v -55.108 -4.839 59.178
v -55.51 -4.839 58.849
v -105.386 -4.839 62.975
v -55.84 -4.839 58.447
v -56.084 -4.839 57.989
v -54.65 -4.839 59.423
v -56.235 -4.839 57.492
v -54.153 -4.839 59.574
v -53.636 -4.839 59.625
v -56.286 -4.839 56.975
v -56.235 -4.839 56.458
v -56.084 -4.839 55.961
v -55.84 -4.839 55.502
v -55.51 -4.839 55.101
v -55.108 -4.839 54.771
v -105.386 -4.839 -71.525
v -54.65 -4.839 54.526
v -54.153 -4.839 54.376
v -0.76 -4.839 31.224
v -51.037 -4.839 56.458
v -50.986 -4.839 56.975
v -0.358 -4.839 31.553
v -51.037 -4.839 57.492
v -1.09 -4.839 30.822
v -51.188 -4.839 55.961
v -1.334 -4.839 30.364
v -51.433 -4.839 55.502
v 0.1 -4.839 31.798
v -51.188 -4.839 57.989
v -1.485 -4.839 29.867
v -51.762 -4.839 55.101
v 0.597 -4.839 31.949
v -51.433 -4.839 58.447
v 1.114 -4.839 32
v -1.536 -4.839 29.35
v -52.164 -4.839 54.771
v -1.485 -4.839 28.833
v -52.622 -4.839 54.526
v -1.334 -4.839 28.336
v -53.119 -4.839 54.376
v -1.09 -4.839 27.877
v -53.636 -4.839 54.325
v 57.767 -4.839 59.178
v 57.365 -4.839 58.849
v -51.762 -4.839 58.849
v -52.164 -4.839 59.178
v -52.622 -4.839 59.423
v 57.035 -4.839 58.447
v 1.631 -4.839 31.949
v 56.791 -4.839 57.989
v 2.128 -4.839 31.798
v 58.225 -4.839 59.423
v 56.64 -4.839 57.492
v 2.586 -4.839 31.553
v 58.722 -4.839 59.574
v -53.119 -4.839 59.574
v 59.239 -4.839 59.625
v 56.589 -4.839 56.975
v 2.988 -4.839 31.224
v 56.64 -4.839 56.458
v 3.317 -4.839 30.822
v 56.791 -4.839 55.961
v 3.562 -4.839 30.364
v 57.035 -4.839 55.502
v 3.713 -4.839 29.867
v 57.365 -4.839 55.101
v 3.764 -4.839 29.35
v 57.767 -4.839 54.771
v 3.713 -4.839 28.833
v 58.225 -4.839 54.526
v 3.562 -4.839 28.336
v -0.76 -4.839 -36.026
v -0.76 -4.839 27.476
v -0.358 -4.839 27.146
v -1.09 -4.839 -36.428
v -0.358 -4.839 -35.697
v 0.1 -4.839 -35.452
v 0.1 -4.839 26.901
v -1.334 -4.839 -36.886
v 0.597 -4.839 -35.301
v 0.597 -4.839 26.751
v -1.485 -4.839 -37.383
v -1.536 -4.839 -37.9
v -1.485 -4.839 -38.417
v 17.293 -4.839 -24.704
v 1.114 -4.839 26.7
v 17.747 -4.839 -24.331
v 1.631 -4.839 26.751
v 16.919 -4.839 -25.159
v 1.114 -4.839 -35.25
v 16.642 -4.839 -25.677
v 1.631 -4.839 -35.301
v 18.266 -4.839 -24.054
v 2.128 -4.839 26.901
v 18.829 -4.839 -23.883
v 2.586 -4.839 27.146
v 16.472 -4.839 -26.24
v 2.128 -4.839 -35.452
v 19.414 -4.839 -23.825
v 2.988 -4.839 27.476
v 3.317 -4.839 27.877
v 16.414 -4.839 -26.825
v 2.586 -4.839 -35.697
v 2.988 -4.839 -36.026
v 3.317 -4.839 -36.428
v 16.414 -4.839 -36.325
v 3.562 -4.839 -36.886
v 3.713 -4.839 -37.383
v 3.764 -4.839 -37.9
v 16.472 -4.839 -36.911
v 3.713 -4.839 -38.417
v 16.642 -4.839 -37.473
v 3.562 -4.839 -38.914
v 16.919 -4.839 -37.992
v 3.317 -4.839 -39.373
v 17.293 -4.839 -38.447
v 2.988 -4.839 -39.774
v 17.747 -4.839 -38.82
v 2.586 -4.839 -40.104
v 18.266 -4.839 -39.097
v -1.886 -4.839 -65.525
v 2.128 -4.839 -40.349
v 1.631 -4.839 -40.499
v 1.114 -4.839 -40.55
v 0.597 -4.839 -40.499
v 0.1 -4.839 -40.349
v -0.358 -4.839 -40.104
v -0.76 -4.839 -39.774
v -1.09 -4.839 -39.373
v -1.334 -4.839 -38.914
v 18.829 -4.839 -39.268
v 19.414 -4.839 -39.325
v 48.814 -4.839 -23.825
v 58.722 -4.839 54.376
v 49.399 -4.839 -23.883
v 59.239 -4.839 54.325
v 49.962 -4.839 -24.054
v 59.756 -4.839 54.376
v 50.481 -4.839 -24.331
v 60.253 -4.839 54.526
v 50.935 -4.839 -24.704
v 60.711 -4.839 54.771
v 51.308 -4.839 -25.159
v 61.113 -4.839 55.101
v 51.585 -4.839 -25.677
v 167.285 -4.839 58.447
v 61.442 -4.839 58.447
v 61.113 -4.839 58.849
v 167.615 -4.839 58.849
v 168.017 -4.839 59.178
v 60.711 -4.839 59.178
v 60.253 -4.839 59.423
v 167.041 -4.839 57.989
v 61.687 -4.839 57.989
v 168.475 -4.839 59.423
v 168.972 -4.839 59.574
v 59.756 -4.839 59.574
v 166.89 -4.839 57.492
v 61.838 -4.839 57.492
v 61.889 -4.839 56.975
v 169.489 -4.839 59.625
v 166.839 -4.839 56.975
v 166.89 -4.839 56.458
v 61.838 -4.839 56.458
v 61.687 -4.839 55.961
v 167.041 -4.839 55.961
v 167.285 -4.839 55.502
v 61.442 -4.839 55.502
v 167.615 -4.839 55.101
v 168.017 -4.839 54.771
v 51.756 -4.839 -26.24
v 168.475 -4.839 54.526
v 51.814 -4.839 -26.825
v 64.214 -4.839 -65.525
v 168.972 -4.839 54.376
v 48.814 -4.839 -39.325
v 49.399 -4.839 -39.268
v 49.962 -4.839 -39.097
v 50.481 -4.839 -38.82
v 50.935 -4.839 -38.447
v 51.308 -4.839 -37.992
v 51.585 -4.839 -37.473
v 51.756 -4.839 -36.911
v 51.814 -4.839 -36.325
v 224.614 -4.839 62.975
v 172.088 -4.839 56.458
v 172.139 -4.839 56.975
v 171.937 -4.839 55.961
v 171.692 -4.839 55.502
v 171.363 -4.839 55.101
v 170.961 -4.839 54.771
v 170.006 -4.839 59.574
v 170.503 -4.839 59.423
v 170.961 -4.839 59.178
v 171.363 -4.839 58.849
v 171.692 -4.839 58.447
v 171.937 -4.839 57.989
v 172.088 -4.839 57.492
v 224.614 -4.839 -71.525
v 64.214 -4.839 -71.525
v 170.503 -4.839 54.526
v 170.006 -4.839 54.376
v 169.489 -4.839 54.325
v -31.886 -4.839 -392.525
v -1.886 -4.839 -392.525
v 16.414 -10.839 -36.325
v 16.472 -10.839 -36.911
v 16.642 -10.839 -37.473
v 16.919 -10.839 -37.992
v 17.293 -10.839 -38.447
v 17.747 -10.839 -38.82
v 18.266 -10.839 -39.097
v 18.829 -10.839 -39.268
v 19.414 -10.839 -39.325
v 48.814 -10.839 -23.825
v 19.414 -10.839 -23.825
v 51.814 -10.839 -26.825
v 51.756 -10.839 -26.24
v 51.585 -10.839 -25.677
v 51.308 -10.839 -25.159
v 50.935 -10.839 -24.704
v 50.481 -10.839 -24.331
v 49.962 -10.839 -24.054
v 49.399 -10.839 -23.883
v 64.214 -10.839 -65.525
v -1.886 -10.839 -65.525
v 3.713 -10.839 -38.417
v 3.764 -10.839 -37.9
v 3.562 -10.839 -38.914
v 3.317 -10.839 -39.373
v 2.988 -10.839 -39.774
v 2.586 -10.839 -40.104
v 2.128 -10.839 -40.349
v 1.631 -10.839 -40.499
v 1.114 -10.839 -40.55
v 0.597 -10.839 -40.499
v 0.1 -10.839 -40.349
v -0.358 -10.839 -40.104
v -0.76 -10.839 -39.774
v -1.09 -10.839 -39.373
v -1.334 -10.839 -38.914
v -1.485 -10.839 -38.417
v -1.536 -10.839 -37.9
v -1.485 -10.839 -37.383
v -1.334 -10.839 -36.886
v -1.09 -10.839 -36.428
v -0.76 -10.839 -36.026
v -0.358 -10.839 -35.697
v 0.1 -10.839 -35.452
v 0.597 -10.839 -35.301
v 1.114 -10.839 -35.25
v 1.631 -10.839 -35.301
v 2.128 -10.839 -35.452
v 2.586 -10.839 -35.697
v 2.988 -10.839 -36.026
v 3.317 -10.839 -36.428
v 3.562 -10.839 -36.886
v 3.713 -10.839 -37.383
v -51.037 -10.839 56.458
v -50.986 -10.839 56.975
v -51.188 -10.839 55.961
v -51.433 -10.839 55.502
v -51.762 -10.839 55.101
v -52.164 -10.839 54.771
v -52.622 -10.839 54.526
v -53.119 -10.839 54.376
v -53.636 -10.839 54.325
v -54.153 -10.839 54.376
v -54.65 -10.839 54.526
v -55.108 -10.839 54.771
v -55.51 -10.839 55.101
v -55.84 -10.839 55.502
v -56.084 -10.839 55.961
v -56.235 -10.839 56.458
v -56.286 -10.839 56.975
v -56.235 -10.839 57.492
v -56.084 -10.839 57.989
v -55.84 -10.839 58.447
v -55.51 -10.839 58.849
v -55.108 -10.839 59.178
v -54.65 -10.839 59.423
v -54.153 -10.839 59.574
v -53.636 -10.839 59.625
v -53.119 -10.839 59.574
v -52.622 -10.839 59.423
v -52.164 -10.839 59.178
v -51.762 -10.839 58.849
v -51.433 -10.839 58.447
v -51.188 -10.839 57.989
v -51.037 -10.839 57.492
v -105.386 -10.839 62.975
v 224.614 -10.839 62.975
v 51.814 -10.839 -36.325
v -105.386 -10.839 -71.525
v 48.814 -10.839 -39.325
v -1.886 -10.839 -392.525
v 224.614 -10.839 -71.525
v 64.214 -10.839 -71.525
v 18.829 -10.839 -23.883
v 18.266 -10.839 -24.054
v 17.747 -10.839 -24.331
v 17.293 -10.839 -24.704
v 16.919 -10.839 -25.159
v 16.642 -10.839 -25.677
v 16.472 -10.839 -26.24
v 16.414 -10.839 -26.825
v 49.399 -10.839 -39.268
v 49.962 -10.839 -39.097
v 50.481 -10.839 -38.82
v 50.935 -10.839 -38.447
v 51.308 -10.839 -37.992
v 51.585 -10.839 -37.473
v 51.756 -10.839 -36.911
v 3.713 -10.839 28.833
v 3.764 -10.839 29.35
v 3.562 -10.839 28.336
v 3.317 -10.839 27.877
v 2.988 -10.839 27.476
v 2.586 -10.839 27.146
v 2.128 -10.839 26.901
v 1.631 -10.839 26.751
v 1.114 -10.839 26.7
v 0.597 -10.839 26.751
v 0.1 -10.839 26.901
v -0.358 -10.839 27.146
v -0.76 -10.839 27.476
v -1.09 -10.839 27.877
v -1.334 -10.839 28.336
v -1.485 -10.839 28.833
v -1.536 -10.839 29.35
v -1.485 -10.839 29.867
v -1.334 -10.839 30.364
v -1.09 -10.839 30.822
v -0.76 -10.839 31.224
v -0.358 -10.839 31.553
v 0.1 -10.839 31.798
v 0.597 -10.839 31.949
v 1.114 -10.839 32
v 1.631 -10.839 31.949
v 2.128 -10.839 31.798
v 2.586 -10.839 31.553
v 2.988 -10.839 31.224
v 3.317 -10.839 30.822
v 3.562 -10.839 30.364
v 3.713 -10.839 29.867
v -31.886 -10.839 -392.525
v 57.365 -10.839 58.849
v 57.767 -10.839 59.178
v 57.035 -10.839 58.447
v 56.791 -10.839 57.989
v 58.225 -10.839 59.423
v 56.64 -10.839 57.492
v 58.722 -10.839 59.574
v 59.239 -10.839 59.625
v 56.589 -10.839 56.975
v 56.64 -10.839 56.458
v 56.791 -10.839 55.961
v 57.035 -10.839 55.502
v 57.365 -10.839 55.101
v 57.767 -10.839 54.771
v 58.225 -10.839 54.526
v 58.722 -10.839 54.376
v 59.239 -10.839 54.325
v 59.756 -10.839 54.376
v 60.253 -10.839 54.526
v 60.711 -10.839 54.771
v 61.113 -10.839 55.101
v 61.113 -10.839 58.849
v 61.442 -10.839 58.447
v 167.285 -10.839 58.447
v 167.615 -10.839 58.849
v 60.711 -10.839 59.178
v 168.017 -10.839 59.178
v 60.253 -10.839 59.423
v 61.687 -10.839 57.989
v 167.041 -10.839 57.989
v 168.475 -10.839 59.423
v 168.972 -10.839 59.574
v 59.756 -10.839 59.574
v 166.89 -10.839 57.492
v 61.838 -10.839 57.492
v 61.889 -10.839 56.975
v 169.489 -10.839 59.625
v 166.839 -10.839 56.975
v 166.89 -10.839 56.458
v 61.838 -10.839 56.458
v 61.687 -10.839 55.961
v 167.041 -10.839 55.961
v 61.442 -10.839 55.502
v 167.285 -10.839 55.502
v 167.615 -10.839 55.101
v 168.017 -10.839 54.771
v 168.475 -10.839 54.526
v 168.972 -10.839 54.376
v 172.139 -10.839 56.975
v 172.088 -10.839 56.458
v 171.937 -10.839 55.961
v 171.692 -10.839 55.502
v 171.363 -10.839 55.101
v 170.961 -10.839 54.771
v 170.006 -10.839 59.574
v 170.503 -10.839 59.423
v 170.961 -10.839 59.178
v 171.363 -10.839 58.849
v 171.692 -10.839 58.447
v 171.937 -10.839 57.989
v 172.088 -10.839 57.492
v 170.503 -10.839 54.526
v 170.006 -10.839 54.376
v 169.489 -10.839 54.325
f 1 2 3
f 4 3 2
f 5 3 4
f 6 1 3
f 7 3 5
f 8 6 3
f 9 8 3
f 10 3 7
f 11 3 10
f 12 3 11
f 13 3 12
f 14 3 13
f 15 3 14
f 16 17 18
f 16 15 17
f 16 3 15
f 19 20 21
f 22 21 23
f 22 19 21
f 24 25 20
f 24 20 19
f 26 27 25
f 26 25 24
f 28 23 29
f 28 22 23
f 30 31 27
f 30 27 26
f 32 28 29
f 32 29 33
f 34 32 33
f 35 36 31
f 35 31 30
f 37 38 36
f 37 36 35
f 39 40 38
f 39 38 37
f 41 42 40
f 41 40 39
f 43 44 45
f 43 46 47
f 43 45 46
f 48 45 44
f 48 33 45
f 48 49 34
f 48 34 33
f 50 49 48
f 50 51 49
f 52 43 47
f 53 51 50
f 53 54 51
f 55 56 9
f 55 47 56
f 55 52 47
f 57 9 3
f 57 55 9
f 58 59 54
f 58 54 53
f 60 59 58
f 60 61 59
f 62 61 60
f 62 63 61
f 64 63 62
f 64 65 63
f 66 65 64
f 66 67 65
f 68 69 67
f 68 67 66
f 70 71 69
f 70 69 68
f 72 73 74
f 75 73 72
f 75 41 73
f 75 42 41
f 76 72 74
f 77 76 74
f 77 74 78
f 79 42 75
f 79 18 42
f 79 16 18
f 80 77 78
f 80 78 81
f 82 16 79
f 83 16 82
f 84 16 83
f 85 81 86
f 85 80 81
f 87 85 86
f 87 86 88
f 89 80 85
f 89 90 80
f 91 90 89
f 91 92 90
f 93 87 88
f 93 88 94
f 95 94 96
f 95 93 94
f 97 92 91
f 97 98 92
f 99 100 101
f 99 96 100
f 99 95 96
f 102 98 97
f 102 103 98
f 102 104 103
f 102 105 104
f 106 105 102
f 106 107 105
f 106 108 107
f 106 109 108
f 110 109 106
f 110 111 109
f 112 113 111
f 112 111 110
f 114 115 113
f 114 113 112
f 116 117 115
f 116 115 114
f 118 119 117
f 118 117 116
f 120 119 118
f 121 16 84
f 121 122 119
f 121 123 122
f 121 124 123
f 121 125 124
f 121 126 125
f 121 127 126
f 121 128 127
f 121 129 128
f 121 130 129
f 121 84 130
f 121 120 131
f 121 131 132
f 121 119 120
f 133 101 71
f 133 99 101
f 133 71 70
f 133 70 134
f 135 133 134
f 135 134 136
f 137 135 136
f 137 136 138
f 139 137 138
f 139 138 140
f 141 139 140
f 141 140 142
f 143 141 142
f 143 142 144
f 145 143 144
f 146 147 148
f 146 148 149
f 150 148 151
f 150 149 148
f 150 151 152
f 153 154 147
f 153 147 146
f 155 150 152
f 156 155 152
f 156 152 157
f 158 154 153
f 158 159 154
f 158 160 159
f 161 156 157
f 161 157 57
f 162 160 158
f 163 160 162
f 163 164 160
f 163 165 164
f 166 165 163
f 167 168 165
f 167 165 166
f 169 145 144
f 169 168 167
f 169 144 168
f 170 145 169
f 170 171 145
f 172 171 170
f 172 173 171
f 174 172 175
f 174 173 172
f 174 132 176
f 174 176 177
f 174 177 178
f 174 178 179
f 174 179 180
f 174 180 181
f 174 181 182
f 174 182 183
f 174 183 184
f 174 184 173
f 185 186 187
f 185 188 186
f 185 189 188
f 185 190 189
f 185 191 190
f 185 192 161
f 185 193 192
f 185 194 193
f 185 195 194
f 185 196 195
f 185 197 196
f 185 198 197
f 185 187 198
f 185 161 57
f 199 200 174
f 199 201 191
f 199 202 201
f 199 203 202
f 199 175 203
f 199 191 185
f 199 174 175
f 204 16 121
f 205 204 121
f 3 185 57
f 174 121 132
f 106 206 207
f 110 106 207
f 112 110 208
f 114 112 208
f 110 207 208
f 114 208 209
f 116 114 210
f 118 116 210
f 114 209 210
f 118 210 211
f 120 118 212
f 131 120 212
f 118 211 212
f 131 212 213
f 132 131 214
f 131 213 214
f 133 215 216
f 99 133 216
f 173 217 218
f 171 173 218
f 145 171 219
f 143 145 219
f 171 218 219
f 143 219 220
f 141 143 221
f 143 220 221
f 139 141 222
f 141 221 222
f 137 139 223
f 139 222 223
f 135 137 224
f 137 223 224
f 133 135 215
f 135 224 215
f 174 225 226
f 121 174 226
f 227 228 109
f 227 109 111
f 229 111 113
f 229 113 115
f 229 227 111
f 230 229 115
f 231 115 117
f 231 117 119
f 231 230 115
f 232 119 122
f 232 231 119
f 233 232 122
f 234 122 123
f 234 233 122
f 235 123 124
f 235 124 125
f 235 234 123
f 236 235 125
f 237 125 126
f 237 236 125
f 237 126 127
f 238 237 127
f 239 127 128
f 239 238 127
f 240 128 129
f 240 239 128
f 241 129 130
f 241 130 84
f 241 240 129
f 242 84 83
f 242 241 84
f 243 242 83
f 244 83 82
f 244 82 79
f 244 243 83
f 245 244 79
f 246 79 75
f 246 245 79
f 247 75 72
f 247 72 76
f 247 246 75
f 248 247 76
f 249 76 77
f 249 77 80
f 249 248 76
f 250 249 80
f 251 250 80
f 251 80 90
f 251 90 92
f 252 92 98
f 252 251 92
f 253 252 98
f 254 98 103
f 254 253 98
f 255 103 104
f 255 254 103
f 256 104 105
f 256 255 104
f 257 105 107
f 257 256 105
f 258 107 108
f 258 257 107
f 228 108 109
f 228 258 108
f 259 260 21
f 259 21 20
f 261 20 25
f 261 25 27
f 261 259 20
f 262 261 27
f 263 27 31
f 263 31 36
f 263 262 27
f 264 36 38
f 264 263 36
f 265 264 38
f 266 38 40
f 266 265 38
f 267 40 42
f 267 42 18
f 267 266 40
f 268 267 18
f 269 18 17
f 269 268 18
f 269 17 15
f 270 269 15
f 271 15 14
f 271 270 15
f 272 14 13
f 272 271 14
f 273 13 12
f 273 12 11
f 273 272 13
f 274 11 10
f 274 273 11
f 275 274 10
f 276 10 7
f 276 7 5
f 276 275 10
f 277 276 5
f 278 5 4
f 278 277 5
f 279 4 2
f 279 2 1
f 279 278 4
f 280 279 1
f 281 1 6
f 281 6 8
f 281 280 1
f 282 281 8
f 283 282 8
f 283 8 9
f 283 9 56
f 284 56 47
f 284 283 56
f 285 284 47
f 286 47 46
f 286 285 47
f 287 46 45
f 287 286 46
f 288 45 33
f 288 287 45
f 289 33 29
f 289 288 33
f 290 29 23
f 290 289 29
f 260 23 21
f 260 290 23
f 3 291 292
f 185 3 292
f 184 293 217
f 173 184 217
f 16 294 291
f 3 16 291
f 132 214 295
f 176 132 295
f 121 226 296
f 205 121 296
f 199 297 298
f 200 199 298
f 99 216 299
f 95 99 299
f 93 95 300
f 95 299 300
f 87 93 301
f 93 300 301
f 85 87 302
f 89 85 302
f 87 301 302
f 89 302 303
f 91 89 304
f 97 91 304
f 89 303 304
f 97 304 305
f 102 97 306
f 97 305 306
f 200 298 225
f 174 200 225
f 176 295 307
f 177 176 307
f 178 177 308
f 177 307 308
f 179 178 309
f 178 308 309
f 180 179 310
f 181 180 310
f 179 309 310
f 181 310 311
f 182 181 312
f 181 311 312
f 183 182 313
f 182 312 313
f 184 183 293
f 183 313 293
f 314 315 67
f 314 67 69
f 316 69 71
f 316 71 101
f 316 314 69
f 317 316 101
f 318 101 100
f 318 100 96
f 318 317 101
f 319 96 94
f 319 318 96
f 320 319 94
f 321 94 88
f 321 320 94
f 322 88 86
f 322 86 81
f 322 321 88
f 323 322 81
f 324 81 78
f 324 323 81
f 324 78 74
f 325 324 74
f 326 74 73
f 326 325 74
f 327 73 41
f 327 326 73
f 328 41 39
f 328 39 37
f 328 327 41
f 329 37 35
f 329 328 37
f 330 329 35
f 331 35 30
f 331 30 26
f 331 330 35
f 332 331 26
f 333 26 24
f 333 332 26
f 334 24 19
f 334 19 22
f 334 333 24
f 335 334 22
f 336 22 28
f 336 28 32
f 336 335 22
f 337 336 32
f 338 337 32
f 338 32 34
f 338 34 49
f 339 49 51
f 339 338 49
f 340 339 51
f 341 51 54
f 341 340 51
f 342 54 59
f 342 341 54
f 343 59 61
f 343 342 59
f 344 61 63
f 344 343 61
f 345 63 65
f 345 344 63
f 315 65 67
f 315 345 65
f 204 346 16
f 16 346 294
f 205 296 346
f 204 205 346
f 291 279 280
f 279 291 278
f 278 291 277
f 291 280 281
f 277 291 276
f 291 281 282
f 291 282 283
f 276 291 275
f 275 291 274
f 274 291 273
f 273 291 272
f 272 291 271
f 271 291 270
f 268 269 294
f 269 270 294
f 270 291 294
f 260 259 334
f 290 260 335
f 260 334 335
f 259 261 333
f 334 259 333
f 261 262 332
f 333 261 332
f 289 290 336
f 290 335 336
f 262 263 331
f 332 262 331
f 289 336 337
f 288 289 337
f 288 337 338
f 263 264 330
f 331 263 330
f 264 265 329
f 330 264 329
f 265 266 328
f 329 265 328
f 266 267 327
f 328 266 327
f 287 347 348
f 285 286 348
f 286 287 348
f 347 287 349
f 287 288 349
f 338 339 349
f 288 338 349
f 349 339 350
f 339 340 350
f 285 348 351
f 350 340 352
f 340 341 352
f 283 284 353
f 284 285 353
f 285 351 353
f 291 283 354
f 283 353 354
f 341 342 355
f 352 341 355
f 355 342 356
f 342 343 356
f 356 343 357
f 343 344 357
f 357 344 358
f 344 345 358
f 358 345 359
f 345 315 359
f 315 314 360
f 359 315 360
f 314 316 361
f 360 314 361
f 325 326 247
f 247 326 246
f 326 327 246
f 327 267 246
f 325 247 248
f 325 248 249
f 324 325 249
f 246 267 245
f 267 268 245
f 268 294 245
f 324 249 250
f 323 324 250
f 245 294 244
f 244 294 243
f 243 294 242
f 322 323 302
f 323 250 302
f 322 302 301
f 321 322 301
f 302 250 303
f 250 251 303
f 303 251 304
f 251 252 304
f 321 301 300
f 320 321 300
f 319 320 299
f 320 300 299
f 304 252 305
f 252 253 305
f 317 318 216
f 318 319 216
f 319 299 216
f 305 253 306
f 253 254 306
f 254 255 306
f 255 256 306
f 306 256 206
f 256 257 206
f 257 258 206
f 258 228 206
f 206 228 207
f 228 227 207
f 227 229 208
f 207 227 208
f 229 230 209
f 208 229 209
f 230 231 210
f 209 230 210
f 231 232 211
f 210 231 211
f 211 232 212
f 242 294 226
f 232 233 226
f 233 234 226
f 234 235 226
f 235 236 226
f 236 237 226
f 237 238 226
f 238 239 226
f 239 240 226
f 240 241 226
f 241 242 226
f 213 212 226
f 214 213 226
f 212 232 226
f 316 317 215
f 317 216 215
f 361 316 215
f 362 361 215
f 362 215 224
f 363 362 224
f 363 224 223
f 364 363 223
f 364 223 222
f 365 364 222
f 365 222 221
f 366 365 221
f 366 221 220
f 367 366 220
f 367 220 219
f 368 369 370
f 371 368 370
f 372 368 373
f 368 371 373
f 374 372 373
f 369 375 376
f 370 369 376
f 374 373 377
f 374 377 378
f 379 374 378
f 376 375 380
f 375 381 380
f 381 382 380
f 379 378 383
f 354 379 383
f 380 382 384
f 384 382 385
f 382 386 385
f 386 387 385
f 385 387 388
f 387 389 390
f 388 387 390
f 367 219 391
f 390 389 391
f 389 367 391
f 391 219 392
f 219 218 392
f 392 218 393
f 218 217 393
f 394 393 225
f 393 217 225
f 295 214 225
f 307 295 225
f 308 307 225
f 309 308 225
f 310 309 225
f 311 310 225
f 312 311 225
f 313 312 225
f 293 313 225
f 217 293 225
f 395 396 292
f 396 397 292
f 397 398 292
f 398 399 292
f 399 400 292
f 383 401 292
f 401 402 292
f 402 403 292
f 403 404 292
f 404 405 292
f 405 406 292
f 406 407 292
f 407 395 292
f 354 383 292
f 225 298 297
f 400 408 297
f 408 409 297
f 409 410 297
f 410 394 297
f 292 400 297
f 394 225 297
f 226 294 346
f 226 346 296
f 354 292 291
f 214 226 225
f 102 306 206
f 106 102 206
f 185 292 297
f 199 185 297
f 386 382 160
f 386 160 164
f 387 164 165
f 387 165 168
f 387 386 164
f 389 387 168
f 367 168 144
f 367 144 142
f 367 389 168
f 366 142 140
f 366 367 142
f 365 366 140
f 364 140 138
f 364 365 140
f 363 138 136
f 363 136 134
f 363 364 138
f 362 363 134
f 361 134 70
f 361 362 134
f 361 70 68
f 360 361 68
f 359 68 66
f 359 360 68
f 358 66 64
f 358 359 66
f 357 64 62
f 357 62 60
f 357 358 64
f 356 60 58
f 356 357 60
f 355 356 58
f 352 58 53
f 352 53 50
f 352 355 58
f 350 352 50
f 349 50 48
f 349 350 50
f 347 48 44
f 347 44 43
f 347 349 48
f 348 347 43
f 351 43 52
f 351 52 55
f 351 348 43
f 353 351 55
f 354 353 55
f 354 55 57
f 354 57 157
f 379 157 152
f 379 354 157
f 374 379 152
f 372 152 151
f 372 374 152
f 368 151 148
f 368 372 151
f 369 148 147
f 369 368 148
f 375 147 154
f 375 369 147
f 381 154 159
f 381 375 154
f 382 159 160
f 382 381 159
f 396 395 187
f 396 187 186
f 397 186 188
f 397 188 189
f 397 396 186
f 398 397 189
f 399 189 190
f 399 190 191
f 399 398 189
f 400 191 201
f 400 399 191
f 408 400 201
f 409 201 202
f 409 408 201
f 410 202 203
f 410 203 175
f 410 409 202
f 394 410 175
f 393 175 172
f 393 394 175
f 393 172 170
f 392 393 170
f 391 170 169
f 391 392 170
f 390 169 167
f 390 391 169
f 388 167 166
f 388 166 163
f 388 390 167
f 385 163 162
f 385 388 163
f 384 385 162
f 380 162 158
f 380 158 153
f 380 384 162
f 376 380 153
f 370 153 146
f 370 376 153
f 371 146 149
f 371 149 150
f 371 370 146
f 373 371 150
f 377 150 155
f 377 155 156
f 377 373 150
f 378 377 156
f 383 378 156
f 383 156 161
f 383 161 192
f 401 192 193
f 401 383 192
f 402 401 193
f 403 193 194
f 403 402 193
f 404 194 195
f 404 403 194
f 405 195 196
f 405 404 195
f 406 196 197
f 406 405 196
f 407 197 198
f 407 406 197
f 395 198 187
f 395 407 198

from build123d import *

# Parameters (mm, degrees)
LEG_START     = -10.839044341
LEG_OUTLINE_R = 2.65
LEG_DEPTH     = 6


# Read off the part's stored shape, not the designer's step: leg
with BuildPart() as part:
    # leg outline → leg (new body)
    with BuildSketch(Plane(origin=(0, 0, 0), x_dir=(1, 0, 0), z_dir=(0, 1, 0)).offset(LEG_START)):
        Polygon((-105.386140363, -62.9747167), (224.613859637, -62.9747167), (224.613859637, 71.5252833), (64.213859637, 71.5252833), (64.213859637, 65.5252833), (-1.886140363, 65.5252833), (-1.886140363, 392.5252833), (-31.886140363, 392.5252833), (-105.386140363, 71.5252833), align=None)
        with Locations((-53.636140363, -56.9747167)):
            Circle(LEG_OUTLINE_R, mode=Mode.SUBTRACT)
        with Locations((1.113859637, -29.3497167)):
            Circle(LEG_OUTLINE_R, mode=Mode.SUBTRACT)
        with Locations((59.238859637, -56.9747167)):
            Circle(LEG_OUTLINE_R, mode=Mode.SUBTRACT)
        with Locations((1.113859637, 37.9002833)):
            Circle(LEG_OUTLINE_R, mode=Mode.SUBTRACT)
        with BuildLine():
            Line((16.413859637, 26.8252833), (16.413859637, 36.3252833))
            ThreePointArc((16.413859637, 36.3252833), (17.292539294, 38.446603644), (19.413859637, 39.3252833))
            Line((19.413859637, 39.3252833), (48.813859637, 39.3252833))
            ThreePointArc((48.813859637, 39.3252833), (50.935179981, 38.446603644), (51.813859637, 36.3252833))
            Line((51.813859637, 36.3252833), (51.813859637, 26.8252833))
            ThreePointArc((51.813859637, 26.8252833), (50.93517998, 24.703962956), (48.813859637, 23.8252833))
            Line((48.813859637, 23.8252833), (19.413859637, 23.8252833))
            ThreePointArc((19.413859637, 23.8252833), (17.292539294, 24.703962957), (16.413859637, 26.8252833))
        make_face(mode=Mode.SUBTRACT)
        with Locations((169.488859637, -56.9747167)):
            Circle(LEG_OUTLINE_R, mode=Mode.SUBTRACT)
    extrude(amount=LEG_DEPTH)


solid = part.part
